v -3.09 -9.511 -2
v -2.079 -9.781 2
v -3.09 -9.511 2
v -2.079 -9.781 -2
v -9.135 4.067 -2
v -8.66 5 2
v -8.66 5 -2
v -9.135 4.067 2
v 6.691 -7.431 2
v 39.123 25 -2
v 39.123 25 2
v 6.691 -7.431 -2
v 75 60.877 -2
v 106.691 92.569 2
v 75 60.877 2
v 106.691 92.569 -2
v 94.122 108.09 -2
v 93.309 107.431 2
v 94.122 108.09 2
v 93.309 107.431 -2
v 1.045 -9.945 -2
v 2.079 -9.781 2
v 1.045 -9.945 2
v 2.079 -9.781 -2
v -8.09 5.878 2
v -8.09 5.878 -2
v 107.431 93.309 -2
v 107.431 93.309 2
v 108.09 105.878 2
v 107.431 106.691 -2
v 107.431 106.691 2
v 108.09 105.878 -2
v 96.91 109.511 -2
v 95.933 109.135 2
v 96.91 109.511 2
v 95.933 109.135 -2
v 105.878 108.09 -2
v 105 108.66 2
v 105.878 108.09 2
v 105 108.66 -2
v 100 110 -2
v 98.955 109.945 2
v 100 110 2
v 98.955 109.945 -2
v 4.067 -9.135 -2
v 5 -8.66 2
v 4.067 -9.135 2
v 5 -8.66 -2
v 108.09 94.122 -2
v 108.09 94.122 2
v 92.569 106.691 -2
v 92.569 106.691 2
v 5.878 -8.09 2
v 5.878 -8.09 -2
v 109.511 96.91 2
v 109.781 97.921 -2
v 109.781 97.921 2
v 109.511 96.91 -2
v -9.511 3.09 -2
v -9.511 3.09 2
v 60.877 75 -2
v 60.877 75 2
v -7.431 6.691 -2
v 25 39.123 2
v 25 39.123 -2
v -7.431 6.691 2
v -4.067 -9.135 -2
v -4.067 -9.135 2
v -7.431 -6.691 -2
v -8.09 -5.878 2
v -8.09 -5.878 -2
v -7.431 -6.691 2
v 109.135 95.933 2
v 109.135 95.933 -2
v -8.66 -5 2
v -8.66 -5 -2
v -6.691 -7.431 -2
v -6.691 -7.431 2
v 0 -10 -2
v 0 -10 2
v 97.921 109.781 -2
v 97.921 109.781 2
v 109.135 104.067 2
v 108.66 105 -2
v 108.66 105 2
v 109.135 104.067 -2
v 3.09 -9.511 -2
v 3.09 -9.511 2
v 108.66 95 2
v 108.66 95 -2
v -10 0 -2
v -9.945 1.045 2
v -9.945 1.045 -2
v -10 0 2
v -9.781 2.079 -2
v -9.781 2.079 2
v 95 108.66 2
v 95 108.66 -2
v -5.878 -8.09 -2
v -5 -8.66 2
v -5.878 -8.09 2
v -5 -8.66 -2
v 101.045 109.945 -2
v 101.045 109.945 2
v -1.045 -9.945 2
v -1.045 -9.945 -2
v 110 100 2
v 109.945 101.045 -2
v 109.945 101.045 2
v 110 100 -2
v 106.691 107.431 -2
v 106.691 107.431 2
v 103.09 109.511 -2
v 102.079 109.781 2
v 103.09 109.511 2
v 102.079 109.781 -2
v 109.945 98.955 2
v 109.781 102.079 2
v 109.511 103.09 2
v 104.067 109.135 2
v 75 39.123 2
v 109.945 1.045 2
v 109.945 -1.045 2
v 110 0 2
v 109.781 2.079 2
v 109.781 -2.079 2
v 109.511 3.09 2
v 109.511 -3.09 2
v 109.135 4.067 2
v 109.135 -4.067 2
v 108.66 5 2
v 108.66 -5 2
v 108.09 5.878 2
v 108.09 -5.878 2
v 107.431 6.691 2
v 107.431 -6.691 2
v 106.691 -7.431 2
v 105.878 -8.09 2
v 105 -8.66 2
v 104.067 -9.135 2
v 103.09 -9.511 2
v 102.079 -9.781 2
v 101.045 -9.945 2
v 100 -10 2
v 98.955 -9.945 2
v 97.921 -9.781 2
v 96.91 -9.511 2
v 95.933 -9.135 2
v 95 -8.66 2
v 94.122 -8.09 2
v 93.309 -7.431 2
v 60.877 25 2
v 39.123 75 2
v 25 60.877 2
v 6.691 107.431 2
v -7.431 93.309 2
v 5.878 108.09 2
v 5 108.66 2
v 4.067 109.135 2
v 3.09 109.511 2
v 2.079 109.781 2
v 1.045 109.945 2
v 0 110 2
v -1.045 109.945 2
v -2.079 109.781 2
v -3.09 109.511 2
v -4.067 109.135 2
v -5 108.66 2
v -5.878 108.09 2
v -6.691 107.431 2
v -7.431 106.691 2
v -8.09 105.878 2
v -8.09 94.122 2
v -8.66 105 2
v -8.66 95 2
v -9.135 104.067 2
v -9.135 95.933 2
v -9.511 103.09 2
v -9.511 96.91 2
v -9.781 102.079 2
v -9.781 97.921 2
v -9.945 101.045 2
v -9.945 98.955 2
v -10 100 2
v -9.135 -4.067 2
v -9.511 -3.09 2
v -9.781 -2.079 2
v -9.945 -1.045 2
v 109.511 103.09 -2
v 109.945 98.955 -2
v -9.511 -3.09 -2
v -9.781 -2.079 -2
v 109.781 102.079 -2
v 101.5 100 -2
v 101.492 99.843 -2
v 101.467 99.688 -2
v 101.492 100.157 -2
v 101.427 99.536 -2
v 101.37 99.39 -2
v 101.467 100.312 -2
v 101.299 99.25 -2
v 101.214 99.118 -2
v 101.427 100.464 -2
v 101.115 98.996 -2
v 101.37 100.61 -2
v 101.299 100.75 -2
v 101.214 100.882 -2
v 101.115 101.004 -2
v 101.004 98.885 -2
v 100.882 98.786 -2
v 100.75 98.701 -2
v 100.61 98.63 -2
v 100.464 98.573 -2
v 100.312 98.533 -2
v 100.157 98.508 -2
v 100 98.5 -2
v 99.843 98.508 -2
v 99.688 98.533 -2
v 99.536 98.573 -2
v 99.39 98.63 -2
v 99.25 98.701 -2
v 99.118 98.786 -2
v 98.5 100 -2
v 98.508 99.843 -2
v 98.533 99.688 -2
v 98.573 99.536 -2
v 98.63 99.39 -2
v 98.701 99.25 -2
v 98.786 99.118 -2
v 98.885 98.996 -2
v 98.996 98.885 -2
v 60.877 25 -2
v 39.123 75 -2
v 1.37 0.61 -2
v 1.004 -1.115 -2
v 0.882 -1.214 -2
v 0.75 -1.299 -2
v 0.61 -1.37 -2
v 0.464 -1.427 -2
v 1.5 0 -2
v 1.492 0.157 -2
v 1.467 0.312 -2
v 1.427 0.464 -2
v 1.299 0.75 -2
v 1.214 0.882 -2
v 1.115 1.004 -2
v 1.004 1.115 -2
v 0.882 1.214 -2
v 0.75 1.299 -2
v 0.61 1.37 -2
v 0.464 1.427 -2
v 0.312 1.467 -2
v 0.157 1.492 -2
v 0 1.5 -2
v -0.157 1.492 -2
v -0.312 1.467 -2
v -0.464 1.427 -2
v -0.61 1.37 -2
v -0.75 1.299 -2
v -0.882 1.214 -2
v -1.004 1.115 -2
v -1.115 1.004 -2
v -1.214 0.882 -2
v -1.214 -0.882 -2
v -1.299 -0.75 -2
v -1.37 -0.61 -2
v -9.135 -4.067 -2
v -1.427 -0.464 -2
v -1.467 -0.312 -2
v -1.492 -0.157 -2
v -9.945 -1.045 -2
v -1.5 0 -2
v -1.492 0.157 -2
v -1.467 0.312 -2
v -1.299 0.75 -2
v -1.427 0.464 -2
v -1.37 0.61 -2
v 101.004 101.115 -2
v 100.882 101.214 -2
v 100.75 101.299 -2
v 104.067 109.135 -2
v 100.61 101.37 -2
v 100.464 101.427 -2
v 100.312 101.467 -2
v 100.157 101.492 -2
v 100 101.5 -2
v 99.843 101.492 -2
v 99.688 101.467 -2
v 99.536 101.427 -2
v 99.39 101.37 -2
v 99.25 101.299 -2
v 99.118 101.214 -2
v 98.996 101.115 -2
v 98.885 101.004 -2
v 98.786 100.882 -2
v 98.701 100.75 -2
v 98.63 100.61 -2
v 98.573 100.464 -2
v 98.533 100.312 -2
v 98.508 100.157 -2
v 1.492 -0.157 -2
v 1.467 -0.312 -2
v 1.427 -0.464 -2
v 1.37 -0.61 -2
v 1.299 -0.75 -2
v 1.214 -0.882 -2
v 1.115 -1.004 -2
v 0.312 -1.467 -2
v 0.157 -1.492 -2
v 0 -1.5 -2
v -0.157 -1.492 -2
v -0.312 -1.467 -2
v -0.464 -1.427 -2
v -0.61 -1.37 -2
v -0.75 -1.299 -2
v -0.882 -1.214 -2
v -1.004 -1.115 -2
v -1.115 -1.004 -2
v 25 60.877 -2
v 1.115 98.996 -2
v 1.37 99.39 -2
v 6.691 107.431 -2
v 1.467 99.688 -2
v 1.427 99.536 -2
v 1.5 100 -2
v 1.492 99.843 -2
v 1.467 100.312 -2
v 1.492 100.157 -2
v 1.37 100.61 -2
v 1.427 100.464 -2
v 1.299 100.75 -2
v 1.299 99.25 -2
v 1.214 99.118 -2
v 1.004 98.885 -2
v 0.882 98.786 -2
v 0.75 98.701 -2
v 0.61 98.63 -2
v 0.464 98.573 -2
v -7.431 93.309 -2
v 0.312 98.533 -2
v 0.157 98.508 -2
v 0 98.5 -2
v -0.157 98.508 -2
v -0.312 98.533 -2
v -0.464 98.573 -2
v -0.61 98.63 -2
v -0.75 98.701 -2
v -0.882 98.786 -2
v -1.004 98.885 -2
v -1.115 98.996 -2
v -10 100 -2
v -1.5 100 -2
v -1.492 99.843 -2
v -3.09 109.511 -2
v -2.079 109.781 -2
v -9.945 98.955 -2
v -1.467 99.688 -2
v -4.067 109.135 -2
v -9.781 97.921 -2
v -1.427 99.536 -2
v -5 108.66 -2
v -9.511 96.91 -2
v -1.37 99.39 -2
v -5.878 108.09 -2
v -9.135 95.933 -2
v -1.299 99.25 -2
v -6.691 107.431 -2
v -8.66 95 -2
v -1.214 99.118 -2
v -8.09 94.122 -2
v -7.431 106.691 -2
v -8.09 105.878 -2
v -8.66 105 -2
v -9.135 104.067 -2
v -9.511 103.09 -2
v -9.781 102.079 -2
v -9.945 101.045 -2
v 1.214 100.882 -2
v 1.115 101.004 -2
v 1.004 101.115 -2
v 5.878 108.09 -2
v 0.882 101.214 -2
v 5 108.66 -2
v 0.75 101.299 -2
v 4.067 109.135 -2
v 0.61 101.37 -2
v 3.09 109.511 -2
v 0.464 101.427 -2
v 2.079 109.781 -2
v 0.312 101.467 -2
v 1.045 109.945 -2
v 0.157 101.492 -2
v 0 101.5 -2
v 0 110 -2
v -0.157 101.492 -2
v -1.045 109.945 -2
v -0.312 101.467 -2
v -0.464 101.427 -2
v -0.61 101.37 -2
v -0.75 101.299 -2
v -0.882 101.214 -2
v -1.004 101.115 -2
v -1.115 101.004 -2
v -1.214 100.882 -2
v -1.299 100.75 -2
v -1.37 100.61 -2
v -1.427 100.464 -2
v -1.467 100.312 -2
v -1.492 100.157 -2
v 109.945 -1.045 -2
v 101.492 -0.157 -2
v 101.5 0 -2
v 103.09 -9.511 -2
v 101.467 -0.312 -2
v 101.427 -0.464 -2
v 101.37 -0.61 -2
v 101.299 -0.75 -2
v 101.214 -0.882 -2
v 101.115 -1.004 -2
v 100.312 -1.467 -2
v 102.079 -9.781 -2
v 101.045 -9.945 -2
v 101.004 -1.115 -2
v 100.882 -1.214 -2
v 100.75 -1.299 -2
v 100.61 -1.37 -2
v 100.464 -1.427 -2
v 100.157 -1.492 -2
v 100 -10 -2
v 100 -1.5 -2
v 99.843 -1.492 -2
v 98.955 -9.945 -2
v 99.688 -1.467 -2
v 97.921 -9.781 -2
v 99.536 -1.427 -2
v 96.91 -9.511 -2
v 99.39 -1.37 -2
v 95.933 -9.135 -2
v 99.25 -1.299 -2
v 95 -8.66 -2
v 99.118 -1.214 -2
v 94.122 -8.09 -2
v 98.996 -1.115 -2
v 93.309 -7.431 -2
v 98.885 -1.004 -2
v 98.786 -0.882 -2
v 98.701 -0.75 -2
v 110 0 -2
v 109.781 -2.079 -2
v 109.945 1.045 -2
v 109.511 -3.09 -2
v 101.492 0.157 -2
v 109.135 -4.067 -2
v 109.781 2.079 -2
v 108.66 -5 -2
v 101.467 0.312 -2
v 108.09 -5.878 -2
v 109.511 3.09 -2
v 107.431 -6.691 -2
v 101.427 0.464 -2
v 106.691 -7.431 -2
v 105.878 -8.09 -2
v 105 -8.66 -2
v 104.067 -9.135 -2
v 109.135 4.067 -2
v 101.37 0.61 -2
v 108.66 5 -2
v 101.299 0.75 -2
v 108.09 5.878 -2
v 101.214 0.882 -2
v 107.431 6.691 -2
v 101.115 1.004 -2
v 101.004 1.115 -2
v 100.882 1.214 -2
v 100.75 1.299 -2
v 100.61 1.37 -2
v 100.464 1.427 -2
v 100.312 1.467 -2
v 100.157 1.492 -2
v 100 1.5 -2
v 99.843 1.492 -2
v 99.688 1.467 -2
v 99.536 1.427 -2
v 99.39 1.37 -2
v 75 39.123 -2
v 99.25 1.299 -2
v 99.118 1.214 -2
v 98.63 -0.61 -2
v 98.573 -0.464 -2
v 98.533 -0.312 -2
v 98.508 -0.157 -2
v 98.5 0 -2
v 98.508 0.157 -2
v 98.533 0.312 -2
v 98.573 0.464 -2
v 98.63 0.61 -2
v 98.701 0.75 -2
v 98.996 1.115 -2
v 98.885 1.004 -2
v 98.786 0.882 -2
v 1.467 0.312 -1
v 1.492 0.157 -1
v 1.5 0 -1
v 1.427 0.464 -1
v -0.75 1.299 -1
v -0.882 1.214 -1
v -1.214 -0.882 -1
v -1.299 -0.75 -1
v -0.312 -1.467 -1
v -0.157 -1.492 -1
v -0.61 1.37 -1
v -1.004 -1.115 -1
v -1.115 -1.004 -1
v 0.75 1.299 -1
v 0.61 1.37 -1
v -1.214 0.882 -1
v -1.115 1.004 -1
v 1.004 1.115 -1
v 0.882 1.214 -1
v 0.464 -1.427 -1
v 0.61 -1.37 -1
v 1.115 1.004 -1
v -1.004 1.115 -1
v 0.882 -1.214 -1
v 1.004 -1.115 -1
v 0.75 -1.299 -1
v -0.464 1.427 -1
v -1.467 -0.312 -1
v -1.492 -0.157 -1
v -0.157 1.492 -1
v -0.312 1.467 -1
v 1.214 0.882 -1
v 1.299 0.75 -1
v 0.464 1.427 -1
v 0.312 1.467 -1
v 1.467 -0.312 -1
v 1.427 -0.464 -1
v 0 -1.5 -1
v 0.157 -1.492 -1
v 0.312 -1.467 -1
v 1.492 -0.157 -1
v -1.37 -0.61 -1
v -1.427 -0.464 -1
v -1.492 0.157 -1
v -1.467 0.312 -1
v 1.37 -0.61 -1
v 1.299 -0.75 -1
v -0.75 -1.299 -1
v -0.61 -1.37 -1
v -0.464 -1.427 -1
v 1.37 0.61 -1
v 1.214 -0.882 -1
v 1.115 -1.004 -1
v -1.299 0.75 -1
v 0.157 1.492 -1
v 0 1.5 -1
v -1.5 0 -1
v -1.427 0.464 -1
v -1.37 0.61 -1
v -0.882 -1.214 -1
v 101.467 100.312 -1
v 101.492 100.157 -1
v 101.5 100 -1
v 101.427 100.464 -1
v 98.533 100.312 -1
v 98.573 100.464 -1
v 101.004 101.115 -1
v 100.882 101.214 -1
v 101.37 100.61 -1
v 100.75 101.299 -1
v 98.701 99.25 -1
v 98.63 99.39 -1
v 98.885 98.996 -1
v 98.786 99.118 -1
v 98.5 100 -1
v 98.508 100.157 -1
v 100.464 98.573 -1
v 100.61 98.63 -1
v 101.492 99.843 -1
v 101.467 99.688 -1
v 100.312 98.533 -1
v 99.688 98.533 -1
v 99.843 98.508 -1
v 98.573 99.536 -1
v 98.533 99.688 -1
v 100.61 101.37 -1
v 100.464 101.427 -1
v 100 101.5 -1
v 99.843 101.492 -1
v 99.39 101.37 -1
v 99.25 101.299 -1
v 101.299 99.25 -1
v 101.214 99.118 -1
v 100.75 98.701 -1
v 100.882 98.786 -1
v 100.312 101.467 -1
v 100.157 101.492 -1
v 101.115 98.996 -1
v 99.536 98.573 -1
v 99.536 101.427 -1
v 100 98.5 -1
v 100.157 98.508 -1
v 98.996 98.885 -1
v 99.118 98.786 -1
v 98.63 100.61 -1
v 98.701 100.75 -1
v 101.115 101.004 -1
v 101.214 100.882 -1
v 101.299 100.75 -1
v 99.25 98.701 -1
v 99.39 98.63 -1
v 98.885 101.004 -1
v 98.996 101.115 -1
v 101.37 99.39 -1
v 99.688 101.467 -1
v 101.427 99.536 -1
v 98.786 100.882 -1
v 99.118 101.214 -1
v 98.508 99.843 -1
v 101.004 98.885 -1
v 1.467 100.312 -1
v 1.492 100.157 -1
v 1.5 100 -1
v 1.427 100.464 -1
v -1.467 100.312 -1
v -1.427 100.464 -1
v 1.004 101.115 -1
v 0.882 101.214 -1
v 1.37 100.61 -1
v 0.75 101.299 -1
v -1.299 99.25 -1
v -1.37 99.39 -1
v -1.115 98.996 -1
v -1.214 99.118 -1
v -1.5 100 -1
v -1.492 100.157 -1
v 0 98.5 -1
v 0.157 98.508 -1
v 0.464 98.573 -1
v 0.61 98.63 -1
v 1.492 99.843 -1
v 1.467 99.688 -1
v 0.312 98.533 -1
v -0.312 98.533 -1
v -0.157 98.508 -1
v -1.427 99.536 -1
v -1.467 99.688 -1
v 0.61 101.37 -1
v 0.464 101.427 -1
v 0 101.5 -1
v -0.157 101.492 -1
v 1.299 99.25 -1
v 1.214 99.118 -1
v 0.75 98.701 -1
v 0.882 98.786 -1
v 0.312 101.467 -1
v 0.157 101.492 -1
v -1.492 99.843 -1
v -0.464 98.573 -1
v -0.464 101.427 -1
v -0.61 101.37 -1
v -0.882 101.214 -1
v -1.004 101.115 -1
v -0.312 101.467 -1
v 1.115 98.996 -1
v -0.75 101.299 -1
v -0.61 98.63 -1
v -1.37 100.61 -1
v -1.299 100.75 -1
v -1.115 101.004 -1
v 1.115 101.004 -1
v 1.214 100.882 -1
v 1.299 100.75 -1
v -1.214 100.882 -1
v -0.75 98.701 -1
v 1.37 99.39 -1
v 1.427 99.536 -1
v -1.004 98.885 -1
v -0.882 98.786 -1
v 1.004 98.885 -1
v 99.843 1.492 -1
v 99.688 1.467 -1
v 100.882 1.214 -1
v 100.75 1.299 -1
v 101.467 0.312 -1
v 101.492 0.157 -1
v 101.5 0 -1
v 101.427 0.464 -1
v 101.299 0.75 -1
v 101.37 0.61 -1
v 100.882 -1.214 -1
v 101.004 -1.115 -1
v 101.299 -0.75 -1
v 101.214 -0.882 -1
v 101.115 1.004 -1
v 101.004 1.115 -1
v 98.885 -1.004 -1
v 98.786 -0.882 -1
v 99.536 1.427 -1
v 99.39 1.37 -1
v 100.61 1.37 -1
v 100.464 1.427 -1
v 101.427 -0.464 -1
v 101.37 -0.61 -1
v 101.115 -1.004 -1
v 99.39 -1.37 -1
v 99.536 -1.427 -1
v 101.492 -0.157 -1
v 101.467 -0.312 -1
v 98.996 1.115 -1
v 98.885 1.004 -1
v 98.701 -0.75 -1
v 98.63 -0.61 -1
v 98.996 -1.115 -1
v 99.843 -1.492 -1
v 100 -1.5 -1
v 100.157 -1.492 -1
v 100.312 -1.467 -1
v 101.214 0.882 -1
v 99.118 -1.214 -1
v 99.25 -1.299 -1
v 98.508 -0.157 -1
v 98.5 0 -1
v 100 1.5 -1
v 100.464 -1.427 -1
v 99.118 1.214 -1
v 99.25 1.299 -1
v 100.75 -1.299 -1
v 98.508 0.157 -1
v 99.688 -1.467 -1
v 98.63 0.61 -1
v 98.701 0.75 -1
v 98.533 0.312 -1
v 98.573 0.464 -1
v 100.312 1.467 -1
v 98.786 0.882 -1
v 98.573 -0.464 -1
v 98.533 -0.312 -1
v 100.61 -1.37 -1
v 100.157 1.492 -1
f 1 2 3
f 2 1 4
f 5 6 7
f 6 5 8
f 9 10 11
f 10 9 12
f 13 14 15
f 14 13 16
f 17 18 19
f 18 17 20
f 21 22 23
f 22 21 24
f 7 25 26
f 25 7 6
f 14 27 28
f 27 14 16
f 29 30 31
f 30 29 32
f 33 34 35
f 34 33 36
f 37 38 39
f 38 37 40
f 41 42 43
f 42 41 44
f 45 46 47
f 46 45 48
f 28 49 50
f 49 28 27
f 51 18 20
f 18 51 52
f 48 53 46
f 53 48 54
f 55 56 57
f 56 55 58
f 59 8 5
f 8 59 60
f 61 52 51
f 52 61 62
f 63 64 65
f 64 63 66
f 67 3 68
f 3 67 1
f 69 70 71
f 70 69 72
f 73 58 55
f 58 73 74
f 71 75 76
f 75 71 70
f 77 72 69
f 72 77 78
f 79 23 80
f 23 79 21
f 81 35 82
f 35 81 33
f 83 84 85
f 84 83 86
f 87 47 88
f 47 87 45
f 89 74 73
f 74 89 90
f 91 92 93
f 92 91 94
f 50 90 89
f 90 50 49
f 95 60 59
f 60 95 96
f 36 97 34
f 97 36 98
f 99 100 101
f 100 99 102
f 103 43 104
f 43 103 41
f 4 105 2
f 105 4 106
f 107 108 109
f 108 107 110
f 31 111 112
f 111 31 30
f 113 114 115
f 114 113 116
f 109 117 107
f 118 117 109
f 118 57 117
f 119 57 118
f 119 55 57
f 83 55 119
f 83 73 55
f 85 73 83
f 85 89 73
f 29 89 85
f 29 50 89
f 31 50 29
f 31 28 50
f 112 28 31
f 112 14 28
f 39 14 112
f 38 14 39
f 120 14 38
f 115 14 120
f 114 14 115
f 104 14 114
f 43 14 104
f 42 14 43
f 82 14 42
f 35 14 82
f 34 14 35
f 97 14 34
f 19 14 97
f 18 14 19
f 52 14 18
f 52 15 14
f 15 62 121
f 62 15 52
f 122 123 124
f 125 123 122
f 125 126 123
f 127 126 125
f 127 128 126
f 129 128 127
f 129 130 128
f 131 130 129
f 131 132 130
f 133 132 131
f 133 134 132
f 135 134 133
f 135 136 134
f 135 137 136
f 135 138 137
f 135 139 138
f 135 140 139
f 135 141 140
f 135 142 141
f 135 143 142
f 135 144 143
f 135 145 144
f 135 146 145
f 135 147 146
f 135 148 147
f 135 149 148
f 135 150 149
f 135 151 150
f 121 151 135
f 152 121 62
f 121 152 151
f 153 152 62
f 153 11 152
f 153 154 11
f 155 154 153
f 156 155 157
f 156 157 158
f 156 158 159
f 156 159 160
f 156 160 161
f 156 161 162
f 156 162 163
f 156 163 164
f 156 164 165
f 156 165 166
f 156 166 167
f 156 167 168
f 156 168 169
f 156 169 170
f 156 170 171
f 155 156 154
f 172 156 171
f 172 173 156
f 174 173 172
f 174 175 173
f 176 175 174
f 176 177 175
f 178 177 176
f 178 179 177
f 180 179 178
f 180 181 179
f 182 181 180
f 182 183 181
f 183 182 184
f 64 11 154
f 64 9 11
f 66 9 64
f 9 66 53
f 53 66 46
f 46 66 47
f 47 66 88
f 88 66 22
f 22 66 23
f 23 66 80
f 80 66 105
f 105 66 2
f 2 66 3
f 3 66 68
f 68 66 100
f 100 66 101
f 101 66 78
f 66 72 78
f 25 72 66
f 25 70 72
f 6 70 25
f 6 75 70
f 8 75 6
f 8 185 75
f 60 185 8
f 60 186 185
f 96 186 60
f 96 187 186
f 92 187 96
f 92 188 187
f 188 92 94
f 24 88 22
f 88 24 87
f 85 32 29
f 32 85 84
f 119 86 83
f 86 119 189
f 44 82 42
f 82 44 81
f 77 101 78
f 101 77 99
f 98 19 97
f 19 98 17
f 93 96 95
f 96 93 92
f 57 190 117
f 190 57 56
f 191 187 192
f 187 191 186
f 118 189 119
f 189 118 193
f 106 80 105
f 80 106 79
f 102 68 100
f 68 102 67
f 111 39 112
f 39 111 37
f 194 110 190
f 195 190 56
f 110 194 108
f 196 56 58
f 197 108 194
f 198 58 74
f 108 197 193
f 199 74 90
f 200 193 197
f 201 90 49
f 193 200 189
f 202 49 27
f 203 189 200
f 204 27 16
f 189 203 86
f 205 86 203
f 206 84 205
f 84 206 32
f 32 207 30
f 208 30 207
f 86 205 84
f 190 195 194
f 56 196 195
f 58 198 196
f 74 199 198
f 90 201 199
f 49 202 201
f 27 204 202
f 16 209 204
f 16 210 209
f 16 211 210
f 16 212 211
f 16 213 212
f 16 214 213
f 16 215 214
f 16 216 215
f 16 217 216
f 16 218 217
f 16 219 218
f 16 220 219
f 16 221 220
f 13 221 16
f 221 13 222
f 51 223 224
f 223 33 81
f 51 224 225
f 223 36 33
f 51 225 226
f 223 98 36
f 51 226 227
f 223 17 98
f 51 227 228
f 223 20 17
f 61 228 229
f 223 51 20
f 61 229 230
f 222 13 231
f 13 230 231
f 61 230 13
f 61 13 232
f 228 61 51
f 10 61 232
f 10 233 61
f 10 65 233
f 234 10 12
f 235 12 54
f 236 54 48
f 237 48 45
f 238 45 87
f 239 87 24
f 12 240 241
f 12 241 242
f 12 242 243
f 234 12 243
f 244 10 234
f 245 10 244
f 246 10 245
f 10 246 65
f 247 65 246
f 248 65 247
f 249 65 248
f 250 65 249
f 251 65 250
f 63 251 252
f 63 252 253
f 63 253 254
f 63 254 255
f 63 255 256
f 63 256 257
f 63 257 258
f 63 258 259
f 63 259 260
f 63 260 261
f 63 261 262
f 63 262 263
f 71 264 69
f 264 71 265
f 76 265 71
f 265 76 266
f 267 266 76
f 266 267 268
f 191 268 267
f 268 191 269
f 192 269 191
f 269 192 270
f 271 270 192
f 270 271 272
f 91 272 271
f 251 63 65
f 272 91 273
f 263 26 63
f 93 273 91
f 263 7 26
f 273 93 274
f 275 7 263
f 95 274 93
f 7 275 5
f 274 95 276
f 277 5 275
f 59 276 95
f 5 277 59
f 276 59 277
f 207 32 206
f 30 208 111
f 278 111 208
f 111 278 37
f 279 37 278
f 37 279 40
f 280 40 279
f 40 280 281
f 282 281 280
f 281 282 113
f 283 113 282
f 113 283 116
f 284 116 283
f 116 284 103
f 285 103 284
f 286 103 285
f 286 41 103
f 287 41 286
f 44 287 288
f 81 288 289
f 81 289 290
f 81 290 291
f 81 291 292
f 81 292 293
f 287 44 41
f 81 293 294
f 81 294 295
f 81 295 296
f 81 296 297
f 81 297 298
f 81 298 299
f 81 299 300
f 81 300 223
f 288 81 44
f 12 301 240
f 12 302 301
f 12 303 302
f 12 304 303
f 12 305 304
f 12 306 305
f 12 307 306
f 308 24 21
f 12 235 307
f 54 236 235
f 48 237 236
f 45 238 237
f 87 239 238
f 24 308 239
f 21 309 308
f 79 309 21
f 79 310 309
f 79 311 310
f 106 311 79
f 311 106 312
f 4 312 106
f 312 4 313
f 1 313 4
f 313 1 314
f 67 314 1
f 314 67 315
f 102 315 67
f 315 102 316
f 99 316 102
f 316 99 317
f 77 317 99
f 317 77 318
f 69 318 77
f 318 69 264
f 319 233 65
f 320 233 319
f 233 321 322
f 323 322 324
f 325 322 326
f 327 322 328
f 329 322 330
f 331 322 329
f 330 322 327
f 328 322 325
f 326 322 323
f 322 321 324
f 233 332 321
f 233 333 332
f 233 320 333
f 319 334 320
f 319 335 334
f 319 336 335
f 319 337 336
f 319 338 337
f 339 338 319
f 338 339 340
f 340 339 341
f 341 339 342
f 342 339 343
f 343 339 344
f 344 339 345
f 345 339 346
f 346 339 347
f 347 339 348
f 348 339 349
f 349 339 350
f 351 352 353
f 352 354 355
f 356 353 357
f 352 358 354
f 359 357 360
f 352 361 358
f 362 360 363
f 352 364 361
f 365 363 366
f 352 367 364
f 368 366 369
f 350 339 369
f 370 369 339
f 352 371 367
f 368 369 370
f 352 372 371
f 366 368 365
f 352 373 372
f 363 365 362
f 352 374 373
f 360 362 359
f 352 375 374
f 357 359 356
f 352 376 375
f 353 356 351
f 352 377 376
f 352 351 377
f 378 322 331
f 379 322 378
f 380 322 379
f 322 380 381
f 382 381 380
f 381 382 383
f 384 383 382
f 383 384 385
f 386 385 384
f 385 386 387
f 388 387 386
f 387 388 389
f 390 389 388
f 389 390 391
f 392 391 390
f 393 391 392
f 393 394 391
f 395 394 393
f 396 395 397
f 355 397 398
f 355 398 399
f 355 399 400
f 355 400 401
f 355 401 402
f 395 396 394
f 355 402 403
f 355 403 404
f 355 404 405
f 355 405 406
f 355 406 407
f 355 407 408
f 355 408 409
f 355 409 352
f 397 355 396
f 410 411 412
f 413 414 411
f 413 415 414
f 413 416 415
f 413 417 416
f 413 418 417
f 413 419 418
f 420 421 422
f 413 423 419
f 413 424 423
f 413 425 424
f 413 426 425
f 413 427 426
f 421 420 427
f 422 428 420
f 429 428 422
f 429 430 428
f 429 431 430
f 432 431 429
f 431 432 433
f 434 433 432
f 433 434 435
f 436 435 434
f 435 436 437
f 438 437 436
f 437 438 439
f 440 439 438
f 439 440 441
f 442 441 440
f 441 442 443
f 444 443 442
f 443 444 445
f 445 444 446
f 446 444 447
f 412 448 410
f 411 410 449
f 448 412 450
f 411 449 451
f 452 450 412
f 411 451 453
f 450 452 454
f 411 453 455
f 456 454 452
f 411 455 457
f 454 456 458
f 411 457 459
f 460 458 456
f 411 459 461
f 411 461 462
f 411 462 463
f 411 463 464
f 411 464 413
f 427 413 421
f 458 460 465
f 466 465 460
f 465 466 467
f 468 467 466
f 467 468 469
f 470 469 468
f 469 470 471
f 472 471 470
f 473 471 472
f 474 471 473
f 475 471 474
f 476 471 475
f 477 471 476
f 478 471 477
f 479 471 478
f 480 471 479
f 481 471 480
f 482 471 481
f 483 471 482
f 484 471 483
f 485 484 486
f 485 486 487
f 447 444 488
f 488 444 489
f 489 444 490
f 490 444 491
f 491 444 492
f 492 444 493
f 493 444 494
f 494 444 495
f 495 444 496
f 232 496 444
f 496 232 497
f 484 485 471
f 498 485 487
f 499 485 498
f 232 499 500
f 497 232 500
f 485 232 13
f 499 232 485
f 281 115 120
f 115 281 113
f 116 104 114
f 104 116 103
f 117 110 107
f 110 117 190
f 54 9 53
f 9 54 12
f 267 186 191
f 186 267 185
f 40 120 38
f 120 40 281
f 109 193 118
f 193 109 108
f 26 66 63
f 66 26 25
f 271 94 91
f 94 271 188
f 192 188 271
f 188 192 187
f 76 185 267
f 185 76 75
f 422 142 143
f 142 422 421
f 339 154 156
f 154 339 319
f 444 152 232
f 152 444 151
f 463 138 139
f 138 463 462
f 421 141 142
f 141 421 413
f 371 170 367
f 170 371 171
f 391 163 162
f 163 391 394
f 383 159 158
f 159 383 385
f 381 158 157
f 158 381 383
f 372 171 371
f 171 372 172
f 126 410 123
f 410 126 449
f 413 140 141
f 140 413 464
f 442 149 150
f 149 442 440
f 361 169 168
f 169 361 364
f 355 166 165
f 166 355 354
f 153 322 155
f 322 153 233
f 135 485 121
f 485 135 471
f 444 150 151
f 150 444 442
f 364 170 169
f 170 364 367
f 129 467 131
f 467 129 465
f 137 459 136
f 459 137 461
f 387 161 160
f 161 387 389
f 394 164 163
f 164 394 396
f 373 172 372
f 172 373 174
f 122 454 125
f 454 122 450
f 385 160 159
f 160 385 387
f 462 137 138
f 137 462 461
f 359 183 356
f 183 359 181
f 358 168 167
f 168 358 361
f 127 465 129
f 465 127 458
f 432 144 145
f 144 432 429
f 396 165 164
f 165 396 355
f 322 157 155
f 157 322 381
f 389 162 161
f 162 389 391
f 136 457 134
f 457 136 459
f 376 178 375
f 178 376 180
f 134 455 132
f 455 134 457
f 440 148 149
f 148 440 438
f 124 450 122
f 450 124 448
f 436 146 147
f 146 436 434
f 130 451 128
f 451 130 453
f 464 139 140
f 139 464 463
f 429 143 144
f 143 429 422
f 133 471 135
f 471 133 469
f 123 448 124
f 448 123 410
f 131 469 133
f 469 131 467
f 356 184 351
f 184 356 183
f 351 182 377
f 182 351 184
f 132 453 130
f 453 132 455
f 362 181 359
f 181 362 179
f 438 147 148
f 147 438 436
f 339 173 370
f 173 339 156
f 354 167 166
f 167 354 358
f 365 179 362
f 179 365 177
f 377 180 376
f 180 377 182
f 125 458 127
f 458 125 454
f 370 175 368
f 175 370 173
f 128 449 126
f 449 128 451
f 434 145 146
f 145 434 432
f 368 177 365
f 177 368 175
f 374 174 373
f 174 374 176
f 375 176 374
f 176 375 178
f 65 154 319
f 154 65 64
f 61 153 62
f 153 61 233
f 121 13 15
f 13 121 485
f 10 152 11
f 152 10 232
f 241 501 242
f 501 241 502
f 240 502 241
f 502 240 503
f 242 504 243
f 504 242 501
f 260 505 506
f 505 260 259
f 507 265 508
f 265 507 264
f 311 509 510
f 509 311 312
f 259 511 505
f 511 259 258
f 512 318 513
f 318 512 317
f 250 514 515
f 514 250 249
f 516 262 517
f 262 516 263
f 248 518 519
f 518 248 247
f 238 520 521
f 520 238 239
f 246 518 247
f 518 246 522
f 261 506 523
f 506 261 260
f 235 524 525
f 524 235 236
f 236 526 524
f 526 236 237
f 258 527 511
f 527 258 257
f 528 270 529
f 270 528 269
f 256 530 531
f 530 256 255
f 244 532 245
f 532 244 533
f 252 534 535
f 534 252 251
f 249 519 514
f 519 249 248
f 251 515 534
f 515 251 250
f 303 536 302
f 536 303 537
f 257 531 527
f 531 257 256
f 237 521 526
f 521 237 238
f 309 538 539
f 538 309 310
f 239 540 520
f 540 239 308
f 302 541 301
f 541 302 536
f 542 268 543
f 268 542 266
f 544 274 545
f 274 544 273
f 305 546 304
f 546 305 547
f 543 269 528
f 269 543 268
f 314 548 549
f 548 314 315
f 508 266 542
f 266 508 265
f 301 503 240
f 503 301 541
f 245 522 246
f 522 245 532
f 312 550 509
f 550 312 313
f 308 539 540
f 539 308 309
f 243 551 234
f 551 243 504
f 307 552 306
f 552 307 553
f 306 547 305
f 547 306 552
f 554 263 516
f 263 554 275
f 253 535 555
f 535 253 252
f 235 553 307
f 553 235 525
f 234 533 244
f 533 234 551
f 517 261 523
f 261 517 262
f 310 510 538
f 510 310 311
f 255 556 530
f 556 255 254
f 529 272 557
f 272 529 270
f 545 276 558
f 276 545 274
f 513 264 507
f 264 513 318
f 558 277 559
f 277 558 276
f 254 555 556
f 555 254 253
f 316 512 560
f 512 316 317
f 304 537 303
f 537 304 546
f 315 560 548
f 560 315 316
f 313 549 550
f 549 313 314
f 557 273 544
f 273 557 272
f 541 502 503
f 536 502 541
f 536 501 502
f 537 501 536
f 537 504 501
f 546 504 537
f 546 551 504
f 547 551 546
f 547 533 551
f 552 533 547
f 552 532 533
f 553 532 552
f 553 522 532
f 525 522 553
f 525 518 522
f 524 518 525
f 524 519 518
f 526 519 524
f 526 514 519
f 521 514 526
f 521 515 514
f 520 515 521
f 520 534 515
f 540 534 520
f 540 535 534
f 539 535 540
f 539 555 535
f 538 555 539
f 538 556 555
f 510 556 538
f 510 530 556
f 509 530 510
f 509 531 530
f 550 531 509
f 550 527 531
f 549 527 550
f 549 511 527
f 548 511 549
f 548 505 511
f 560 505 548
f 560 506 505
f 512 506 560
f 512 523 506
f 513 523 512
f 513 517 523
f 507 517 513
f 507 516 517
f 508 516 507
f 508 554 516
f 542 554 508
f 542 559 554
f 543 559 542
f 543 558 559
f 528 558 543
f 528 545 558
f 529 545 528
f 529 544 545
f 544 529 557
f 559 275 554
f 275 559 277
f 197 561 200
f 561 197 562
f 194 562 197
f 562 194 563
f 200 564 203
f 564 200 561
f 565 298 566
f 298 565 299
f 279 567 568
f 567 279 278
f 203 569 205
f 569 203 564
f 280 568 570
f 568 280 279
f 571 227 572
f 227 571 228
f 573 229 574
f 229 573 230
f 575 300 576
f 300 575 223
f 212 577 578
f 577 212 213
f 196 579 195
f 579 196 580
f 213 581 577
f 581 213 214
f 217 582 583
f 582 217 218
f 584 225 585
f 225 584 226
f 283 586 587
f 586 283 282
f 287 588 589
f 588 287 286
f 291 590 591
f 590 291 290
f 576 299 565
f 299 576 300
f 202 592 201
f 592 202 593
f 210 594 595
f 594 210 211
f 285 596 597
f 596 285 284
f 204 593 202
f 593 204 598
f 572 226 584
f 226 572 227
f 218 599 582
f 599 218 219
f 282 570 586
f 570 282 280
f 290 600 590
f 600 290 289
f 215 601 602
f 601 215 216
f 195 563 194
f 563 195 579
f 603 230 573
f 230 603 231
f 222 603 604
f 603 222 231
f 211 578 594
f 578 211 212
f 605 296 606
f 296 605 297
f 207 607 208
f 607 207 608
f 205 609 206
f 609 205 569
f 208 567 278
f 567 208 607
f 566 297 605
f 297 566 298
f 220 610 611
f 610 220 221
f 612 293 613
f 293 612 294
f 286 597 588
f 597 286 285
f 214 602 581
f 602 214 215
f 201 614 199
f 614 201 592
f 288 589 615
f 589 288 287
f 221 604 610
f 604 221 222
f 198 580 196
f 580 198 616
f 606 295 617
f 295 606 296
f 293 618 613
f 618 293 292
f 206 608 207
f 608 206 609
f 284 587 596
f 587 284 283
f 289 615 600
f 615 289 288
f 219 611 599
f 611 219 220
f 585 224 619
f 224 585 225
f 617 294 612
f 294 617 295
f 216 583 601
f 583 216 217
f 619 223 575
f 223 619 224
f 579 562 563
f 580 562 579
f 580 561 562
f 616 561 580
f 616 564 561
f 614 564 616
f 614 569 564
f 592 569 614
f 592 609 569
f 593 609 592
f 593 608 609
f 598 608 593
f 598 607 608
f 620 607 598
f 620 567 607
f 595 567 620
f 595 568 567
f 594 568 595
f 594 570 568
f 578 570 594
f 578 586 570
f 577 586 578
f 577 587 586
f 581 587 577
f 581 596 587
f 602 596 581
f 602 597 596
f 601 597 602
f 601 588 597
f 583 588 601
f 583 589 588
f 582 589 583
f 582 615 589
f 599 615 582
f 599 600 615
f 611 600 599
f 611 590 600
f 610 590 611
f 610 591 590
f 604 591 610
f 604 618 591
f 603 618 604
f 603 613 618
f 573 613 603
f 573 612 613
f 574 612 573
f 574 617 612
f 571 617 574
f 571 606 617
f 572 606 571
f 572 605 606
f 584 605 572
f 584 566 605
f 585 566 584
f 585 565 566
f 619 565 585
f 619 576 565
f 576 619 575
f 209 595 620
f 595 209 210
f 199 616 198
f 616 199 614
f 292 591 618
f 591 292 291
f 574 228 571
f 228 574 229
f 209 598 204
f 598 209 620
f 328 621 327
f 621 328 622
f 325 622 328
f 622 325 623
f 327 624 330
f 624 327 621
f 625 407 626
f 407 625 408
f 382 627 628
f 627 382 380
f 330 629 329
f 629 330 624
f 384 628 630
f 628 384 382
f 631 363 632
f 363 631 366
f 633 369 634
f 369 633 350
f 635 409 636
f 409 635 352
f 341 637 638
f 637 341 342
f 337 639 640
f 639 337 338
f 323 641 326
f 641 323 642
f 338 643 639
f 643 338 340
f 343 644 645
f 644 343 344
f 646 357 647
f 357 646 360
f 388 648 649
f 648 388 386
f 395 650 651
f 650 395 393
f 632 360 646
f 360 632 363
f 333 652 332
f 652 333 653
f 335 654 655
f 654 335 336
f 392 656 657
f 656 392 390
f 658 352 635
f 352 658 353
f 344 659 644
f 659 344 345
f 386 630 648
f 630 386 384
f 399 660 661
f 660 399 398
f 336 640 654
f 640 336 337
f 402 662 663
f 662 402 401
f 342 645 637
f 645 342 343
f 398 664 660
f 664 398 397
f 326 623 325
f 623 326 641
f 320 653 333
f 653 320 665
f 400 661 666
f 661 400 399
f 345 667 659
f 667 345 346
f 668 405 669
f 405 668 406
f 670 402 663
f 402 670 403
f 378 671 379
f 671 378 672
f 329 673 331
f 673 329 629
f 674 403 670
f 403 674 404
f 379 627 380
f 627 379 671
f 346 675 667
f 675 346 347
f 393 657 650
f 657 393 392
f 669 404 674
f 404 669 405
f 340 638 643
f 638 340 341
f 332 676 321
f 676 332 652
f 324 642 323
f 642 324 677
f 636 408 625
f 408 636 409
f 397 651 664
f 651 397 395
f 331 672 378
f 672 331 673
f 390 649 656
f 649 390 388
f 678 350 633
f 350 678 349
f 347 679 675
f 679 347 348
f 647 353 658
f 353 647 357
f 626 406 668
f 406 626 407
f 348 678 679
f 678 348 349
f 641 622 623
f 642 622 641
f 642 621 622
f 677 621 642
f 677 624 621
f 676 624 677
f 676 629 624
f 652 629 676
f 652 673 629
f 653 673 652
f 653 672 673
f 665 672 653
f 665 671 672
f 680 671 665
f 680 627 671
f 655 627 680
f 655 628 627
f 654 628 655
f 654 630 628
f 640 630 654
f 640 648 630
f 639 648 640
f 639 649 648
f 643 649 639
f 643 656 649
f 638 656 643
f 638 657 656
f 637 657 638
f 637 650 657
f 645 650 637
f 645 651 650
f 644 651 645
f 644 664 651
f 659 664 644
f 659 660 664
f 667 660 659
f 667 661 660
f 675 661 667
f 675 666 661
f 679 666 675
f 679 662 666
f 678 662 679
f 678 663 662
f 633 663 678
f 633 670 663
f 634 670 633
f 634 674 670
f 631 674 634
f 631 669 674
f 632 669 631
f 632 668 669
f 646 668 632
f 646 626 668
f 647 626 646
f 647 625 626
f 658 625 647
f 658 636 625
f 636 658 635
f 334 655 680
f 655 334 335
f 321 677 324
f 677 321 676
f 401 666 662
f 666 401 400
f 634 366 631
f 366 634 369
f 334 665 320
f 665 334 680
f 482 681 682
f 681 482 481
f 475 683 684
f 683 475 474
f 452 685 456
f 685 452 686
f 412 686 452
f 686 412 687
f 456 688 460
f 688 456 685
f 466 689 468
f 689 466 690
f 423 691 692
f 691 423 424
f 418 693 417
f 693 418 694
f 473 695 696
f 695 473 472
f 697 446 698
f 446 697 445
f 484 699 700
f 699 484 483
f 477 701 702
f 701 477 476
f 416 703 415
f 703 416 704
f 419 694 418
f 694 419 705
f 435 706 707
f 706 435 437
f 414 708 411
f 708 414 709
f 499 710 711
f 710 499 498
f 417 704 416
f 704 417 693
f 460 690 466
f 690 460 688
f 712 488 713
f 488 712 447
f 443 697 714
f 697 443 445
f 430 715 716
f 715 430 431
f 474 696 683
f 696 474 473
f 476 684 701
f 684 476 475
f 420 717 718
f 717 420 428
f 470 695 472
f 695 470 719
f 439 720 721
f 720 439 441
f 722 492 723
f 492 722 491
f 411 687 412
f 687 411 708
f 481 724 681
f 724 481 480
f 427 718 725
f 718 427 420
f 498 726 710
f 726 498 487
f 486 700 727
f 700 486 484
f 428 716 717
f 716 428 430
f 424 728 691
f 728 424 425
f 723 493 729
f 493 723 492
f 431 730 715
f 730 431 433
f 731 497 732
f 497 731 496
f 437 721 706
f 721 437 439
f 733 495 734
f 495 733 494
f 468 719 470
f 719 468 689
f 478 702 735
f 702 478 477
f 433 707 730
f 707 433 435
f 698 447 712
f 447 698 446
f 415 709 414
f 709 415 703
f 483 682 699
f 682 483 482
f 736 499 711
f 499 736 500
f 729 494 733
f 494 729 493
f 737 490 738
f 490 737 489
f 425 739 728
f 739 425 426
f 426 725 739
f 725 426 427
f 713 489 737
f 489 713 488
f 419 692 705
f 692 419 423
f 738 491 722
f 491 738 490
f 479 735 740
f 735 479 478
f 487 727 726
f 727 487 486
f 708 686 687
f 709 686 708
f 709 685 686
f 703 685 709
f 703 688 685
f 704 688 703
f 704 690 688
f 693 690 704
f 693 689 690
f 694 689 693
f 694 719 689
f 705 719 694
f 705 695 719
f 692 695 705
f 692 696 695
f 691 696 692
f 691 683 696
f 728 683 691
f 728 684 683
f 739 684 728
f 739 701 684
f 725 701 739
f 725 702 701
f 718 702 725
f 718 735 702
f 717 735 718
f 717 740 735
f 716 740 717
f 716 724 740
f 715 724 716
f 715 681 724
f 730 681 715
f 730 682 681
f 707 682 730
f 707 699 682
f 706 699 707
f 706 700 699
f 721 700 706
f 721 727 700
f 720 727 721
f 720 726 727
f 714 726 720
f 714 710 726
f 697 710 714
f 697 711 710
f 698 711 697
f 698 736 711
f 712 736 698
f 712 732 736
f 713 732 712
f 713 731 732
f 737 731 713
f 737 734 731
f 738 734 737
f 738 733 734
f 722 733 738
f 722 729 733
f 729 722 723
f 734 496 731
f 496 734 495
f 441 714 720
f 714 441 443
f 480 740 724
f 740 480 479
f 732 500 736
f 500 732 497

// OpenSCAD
// file: ../lib/utils.scad
///< Utilities

function rand_clr() = rands( 0,1,3 );

///< Length conversions
function in2mm( i ) = ( i * 25.4 ); 
function mm2in( m ) = ( m / 25.4 );

/// This is pulled from stackoverflow
/// https://stackoverflow.com/questions/45826208/openscad-rotating-around-a-particular-point

// rotate as per a, v, but around point pt
module rotate_about_pt(z, y, pt) {
    translate(pt)
        rotate([0, y, z ])
            translate(-pt)
                children();   
}

function adjust_z_offset( v, z ) = [for (i=[0:(len(v)-1)]) v[i]+[0,0,z]] ;

///< For each child, translate child by <p> point in points
module foreach_translate(points ){
	for (p=points){
		translate(p) children();
	}
}
// file: ../lib/math.scad
///< Math scad module


function min( x, y ) = x<=y?x:y;
function max( x, y)  = x>=y?x:y;
function xlty( x, y ) = x<y;
function xgty( x, y ) = x>y;

///< Find the hypotenuse from two sides of a right triangle
function hyp_from_sides( a, b ) = sqrt( pow( a, 2 ) + pow( b, 2 ) );

///< Find equal sides from hypotenuse of a right triangle
function sides_from_hyp(h) = sqrt( pow( h, 2 ) / 2 );

///< Find A from hypotenuse and B
function a_from_hb( h, b ) = sqrt( pow( h, 2 ) - pow( b, 2 ) );

function dist_2d( pt2, pt1 ) = sqrt(pow(( pt2[0]-pt1[0] ),2) + pow(( pt2[1]-pt1[1]),2) );

function mid_pt_2d( pt2, pt1 ) = [( pt1[0]+pt2[0] )/2, ( pt1[1]+pt2[1] )/2, 0 ];

function opposite_side_th( theta, hypotenuse ) = sin( theta )*hypotenuse ;
function adjacent_side_th( theta, hypotenuse ) = cos( theta )*hypotenuse ;

///< Test for math functions

A = 3;
B = 4;
echo("Given A=", A, "and B=", B );
H = hyp_from_sides( A, B );
echo("Hypotenuse=", H );
echo("Calc Correct = ", (H == 5) );

echo("Given H=", H, " which is a hypotenuse with equal sides" );
echo( "the sides=", sides_from_hyp( H ) );

echo("Given H=", H, "B=", 4 );
echo("A=", a_from_hb( H, 4 ) );

echo("Distance from [-1,1] and [3,4] = ", dist_2d( [-1,1],[3,4]) );

echo( "Opposite = ", opposite_side_th( 39.0, 30 ), "Theta = ", 39.0, "Hypotenuse = ", 30 );
echo( "Adjacent = ", adjacent_side_th( 60.0, 10 ), "Theta = ", 60.0, "Hypotenuse = ", 10 );

///< Find the sum of a vector <vect> starting from <s> and continuing to <i>
function sumv( vect, i, s=0 ) = ( i == s ? vect[ i ] : vect[ i ] + sumv( vect, i - 1, s ) );
vec = [ 1, 2, 3, 4 ];
l = len( vec )-1;
echo( "Sum vec = ", sumv( vec, l, 0 ) );

///< Find the average of a vector <vect> starting at <s>
function average( vect, s=0 ) = (len( vect ) == 0 ? 0 : ( sumv( vect, len( vect ) - 1, s )/len(vect) ) );
echo( "Ave vec = ", average( vec ) );
vec2 = [];
echo( "Ave vec2 = ", average( vec2 ) );
// main file
///< Object definition
use <../lib/math.scad>;
use <../lib/utils.scad>;


/*
Module: Name
   Preamble and description

*/

/*
Parameters
*/
$fn = 60;

// VESA modes
vesa_mode = "VESA100"; // [ VESA75, VESA100, VESA200, VESA400 ]

// Thread Diameter
thread_d = 3; // [ 0: 0.1: 10]

// Height
height = 4; // [ 0: 0.1: 30 ]

// Plate Width
plate_w = 20; // [0: 1: 50 ]

// Center Plate
center_plate = true;

///< Parameters after this are hidden from the customizer
module __Customizer_Limit__(){}
_modes = [
          ["VESA75",   75 ],
          ["VESA100", 100 ],
          ["VESA200", 200 ],
          ["VESA400", 400 ],
          ];

_hardware = [
             [ "M2",   0 ],
             [ "M2.5", 0 ],
             [ "M3",   0 ],
             [ "M4",   0 ],
             [ "M5",   0 ],
             [ "M6",   0 ],
             ];

function variations( mode = "VESA400" )=
    _modes[ search( [mode], _modes, 1, 0)[0]][1];

module cylinders( pts, d, h ){
    for( p = pts ){
        translate( p )
            cylinder( h = h, d = d, center = true );
    }
}

module plate( pts, d, h, hole_d ){
    difference(){
        hull(){
            cylinders( pts, d, h );
            cylinders( pts, hole_d, h );
        }
    }
}

///< Modules
module vesa( mode, thread_d = thread_d,  width = plate_w, h = height, center_plate = true ){
    points = [
              /* Plate 1 */
              [ 0,    0,    0 ],
              [ mode, mode, 0 ],

              /* Plate 2 */
              [ 0,    mode, 0 ],
              [ mode, 0,    0 ],
              ];
    plate1 = [
              points[0],
              points[1]
              ];
    plate2 = [
              points[2],
              points[3]
              ];
    

    difference(){
        union(){
            plate( plate1, width, h, thread_d );
            plate( plate2, width, h, thread_d );
            if( center_plate ){
                mid = mid_pt_2d( points[2], points[3] );
                echo( "Mid", mid );
                translate([mode/2,mode/2,-h/2])
                    linear_extrude( height = h )
                    color( "cyan" ) #square( mid[0], center = true );
            }
        }
        for( pt  = points )
            translate( pt )
                translate([0,0,-h/2])
                #cylinder( h = h, d = thread_d, true );
    }
        

    
}

///< Build object
mode = variations( vesa_mode );
echo( "Variation: ", vesa_mode, mode );
vesa( variations( vesa_mode ) );
